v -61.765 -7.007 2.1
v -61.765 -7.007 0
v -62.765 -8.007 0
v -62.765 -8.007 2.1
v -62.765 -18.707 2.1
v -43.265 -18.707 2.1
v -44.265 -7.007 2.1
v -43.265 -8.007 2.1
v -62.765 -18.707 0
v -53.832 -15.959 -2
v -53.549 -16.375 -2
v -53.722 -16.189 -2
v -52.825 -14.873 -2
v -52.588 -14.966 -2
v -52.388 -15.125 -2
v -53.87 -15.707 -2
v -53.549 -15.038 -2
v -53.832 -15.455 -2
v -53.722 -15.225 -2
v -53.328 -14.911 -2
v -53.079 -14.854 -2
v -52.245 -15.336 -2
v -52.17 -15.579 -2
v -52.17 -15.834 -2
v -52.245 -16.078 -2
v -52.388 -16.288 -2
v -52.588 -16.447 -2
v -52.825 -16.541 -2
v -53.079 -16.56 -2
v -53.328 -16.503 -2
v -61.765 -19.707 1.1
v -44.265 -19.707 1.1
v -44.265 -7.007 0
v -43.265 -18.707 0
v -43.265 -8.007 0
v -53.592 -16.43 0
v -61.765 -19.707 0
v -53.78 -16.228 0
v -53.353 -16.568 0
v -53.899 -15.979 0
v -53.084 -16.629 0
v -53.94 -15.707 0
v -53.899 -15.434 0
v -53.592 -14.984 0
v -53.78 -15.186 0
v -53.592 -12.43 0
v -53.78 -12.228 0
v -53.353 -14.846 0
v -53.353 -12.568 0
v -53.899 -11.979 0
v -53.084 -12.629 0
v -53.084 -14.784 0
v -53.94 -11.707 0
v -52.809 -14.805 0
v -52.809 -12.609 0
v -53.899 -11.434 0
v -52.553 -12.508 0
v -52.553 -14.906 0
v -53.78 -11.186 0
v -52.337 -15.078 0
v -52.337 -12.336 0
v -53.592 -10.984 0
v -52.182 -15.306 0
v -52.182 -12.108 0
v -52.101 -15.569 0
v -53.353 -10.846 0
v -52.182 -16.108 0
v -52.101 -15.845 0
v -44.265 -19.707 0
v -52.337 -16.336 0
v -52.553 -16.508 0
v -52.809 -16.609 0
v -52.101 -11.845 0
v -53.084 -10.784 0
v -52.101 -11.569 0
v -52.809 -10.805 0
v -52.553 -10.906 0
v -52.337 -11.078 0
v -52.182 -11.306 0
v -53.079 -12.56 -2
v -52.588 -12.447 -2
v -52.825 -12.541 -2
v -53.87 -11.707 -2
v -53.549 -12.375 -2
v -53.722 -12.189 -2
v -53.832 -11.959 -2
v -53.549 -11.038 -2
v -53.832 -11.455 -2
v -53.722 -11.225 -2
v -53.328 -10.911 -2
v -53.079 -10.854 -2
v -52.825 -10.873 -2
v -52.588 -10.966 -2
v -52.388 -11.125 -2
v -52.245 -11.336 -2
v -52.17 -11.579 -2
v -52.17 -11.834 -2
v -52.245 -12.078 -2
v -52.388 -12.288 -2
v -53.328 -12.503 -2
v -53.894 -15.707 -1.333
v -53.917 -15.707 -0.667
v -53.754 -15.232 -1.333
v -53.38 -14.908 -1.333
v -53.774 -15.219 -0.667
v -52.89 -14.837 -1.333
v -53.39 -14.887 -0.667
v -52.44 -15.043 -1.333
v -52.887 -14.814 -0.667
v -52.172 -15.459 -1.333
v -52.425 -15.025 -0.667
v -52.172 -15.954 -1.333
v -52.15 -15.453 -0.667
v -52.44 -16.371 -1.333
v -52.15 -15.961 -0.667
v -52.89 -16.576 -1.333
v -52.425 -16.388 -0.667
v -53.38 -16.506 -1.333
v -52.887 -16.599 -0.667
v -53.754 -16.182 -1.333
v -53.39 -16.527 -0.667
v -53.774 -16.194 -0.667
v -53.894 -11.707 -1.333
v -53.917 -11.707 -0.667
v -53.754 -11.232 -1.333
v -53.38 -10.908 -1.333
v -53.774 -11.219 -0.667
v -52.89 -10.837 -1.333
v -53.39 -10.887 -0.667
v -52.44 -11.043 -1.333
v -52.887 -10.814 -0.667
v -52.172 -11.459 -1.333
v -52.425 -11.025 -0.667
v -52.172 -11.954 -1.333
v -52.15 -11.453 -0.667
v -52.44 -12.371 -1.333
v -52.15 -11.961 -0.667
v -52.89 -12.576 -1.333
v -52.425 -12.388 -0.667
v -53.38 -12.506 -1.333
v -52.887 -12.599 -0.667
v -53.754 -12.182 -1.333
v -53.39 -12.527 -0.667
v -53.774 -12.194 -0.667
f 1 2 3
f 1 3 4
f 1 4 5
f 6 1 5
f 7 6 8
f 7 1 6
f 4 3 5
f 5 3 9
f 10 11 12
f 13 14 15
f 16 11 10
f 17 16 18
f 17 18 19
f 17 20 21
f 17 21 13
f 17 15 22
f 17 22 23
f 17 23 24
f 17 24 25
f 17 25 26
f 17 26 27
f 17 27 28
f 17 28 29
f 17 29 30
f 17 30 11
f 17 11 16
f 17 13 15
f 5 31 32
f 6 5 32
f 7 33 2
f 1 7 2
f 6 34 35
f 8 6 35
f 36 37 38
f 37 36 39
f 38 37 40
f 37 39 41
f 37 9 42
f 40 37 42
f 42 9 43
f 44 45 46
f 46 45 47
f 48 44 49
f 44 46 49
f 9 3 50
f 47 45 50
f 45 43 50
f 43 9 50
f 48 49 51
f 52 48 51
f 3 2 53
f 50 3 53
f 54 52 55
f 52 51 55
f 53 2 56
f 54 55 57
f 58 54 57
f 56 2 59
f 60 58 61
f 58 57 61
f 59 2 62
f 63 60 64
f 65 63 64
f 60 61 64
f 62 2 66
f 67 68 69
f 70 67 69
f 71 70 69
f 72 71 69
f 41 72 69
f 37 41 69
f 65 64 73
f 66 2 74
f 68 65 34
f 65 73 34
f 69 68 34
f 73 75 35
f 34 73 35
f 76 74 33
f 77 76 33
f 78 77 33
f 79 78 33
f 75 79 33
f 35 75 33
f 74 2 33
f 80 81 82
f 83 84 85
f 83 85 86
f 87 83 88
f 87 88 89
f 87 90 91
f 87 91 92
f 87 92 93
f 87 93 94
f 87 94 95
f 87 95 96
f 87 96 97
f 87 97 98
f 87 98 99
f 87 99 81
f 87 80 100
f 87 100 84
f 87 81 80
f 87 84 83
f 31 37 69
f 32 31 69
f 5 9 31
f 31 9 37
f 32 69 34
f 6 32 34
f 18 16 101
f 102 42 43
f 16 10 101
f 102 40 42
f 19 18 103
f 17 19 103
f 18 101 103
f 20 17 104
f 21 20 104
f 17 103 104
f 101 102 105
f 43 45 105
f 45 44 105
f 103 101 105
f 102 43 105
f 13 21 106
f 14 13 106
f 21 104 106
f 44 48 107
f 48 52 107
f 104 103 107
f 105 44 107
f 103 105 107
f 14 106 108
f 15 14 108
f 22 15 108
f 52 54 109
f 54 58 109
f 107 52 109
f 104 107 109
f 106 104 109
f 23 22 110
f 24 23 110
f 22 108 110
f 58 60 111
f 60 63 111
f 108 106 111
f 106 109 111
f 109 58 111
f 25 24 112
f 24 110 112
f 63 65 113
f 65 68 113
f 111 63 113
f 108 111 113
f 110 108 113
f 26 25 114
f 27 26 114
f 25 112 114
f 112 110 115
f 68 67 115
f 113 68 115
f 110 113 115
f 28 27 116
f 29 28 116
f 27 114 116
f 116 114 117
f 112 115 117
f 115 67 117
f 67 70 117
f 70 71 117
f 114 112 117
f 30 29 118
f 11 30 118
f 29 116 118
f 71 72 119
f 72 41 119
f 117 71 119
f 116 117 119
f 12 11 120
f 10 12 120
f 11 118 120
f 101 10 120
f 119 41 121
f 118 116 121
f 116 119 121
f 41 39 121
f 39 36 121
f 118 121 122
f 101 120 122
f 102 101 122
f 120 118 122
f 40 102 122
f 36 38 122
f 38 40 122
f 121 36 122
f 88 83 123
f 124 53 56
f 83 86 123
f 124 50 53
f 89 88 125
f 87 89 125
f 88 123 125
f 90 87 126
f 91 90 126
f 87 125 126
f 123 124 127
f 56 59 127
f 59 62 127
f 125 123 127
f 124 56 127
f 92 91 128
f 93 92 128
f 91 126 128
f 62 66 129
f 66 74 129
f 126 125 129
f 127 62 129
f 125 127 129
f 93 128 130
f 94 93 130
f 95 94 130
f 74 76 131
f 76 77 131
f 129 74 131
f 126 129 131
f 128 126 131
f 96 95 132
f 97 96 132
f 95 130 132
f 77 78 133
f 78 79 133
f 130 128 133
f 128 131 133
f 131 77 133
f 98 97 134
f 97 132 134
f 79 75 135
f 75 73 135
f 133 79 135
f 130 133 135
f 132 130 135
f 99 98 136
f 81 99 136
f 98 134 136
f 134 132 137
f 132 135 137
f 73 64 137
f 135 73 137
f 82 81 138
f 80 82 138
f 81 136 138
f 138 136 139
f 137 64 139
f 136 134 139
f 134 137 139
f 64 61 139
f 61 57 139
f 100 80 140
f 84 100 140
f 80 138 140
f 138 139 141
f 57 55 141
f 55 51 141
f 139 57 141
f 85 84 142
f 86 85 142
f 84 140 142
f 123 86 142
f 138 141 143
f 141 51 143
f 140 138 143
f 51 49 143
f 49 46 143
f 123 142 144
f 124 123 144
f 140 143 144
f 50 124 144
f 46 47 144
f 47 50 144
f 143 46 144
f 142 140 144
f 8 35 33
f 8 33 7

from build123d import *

# Parameters (mm, degrees)
BUTTON_1_DEPTH            = 2.1
SKETCH_1_R                = 0.925
EXTRUDE_1_DEPTH           = 2
EXTRUDE_1_DRAFT           = 2
EXTRUDE_1_PROFILE_2_DEPTH = 2
EXTRUDE_1_PROFILE_2_DRAFT = 2
CHAMFER_1_SIZE            = 1
CHAMFER_2_SIZE            = 1


# Read off the part's stored shape, not the designer's step: 基体零件-button-1
with BuildPart() as part:
    # 基体零件-button-1 outline → 基体零件-button-1 (new body)
    with BuildSketch(Plane.XY):
        Polygon((-62.765330564, -7.006843897), (-62.765330564, -18.706843897), (-61.765330564, -19.706843897), (-44.265330564, -19.706843897), (-43.265330564, -18.706843897), (-43.265330564, -7.006843897), align=None)
    extrude(amount=BUTTON_1_DEPTH)


with BuildPart() as extrude_1_tool:
    # 草图1 → 凸台-拉伸1 (with draft: the straight prism first)
    with BuildSketch(Plane(origin=(0, 0, 0), x_dir=(-1, 0, 0), z_dir=(0, 0, -1))):
        with Locations((53.015330564, -11.706843897)):
            Circle(SKETCH_1_R)
    extrude(amount=EXTRUDE_1_DEPTH)
    # 凸台-拉伸1: the draft: its side faces are tilted about the plane it starts from
    extrude_1_sides = [extrude_1_tool.faces().sort_by_distance(p)[0] for p in [
        (-52.090330564, -11.706843897, -1),
    ]]
    draft(extrude_1_sides, Plane(origin=(0, 0, 0), x_dir=(-1, 0, 0), z_dir=(0, 0, -1)), EXTRUDE_1_DRAFT)


with BuildPart() as part_1:
    add(part.part)

    # 凸台-拉伸1: add extrude_1_tool
    add(extrude_1_tool.part)


with BuildPart() as extrude_1_profile_2_tool:
    # 草图1 → 凸台-拉伸1 profile 2 (with draft: the straight prism first)
    with BuildSketch(Plane(origin=(0, 0, 0), x_dir=(-1, 0, 0), z_dir=(0, 0, -1))):
        with Locations((53.015330564, -15.706843897)):
            Circle(SKETCH_1_R)
    extrude(amount=EXTRUDE_1_PROFILE_2_DEPTH)
    # 凸台-拉伸1 profile 2: the draft: its side faces are tilted about the plane it starts from
    extrude_1_profile_2_sides = [extrude_1_profile_2_tool.faces().sort_by_distance(p)[0] for p in [
        (-52.090330564, -15.706843897, -1),
    ]]
    draft(extrude_1_profile_2_sides, Plane(origin=(0, 0, 0), x_dir=(-1, 0, 0), z_dir=(0, 0, -1)), EXTRUDE_1_PROFILE_2_DRAFT)


with BuildPart() as part_2:
    add(part_1.part)

    # 凸台-拉伸1 profile 2: add extrude_1_profile_2_tool
    add(extrude_1_profile_2_tool.part)

    # 倒角1
    chamfer_1_edges = [part_2.edges().sort_by_distance(p)[0] for p in [
        (-53.015330564, -19.706843897, 2.1),
    ]]
    chamfer(chamfer_1_edges, length=CHAMFER_1_SIZE)

    # 倒角2
    chamfer_2_edges = [part_2.edges().sort_by_distance(p)[0] for p in [
        (-62.765330564, -7.006843897, 1.05),
        (-43.265330564, -7.006843897, 1.05),
    ]]
    chamfer(chamfer_2_edges, length=CHAMFER_2_SIZE)


solid = part_2.part
